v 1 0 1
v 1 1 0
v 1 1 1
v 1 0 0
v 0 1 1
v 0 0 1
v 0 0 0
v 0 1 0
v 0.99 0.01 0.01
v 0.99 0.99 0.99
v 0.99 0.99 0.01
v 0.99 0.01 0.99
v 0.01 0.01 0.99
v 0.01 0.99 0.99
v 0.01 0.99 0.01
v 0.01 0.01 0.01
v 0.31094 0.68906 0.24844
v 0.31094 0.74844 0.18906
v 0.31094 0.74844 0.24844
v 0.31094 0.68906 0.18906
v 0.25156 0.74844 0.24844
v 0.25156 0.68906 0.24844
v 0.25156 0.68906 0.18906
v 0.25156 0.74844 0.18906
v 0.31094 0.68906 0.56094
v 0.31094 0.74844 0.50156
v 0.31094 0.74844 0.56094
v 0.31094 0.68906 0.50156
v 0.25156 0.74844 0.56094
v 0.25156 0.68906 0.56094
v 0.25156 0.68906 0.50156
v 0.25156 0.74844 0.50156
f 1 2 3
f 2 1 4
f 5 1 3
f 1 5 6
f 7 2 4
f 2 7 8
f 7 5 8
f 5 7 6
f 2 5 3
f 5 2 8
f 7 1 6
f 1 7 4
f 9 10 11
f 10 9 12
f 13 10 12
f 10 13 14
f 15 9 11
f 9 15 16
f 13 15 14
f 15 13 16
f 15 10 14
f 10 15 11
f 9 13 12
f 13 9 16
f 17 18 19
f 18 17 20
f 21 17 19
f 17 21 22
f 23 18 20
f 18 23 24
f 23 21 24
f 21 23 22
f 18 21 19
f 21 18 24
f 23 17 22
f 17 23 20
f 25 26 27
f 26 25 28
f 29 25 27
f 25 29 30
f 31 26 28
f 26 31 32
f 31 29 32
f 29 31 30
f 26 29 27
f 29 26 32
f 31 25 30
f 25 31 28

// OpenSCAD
translate([0.28125, 0.71875, 0.21875]) color([0.653059881463713, 0.6142769599845324, 0.5194227139903652]) cube([0.059375, 0.059375, 0.059375], center=true);
translate([0.28125, 0.71875, 0.53125]) color([0.4882648752000045, 0.6667696127510514, 0.4922862878721691]) cube([0.059375, 0.059375, 0.059375], center=true);
color([0.3,0.3,0.3,0.3]) difference() { cube([1,1,1]); translate([0.01,0.01,0.01]) cube([0.98,0.98,0.98]); }
